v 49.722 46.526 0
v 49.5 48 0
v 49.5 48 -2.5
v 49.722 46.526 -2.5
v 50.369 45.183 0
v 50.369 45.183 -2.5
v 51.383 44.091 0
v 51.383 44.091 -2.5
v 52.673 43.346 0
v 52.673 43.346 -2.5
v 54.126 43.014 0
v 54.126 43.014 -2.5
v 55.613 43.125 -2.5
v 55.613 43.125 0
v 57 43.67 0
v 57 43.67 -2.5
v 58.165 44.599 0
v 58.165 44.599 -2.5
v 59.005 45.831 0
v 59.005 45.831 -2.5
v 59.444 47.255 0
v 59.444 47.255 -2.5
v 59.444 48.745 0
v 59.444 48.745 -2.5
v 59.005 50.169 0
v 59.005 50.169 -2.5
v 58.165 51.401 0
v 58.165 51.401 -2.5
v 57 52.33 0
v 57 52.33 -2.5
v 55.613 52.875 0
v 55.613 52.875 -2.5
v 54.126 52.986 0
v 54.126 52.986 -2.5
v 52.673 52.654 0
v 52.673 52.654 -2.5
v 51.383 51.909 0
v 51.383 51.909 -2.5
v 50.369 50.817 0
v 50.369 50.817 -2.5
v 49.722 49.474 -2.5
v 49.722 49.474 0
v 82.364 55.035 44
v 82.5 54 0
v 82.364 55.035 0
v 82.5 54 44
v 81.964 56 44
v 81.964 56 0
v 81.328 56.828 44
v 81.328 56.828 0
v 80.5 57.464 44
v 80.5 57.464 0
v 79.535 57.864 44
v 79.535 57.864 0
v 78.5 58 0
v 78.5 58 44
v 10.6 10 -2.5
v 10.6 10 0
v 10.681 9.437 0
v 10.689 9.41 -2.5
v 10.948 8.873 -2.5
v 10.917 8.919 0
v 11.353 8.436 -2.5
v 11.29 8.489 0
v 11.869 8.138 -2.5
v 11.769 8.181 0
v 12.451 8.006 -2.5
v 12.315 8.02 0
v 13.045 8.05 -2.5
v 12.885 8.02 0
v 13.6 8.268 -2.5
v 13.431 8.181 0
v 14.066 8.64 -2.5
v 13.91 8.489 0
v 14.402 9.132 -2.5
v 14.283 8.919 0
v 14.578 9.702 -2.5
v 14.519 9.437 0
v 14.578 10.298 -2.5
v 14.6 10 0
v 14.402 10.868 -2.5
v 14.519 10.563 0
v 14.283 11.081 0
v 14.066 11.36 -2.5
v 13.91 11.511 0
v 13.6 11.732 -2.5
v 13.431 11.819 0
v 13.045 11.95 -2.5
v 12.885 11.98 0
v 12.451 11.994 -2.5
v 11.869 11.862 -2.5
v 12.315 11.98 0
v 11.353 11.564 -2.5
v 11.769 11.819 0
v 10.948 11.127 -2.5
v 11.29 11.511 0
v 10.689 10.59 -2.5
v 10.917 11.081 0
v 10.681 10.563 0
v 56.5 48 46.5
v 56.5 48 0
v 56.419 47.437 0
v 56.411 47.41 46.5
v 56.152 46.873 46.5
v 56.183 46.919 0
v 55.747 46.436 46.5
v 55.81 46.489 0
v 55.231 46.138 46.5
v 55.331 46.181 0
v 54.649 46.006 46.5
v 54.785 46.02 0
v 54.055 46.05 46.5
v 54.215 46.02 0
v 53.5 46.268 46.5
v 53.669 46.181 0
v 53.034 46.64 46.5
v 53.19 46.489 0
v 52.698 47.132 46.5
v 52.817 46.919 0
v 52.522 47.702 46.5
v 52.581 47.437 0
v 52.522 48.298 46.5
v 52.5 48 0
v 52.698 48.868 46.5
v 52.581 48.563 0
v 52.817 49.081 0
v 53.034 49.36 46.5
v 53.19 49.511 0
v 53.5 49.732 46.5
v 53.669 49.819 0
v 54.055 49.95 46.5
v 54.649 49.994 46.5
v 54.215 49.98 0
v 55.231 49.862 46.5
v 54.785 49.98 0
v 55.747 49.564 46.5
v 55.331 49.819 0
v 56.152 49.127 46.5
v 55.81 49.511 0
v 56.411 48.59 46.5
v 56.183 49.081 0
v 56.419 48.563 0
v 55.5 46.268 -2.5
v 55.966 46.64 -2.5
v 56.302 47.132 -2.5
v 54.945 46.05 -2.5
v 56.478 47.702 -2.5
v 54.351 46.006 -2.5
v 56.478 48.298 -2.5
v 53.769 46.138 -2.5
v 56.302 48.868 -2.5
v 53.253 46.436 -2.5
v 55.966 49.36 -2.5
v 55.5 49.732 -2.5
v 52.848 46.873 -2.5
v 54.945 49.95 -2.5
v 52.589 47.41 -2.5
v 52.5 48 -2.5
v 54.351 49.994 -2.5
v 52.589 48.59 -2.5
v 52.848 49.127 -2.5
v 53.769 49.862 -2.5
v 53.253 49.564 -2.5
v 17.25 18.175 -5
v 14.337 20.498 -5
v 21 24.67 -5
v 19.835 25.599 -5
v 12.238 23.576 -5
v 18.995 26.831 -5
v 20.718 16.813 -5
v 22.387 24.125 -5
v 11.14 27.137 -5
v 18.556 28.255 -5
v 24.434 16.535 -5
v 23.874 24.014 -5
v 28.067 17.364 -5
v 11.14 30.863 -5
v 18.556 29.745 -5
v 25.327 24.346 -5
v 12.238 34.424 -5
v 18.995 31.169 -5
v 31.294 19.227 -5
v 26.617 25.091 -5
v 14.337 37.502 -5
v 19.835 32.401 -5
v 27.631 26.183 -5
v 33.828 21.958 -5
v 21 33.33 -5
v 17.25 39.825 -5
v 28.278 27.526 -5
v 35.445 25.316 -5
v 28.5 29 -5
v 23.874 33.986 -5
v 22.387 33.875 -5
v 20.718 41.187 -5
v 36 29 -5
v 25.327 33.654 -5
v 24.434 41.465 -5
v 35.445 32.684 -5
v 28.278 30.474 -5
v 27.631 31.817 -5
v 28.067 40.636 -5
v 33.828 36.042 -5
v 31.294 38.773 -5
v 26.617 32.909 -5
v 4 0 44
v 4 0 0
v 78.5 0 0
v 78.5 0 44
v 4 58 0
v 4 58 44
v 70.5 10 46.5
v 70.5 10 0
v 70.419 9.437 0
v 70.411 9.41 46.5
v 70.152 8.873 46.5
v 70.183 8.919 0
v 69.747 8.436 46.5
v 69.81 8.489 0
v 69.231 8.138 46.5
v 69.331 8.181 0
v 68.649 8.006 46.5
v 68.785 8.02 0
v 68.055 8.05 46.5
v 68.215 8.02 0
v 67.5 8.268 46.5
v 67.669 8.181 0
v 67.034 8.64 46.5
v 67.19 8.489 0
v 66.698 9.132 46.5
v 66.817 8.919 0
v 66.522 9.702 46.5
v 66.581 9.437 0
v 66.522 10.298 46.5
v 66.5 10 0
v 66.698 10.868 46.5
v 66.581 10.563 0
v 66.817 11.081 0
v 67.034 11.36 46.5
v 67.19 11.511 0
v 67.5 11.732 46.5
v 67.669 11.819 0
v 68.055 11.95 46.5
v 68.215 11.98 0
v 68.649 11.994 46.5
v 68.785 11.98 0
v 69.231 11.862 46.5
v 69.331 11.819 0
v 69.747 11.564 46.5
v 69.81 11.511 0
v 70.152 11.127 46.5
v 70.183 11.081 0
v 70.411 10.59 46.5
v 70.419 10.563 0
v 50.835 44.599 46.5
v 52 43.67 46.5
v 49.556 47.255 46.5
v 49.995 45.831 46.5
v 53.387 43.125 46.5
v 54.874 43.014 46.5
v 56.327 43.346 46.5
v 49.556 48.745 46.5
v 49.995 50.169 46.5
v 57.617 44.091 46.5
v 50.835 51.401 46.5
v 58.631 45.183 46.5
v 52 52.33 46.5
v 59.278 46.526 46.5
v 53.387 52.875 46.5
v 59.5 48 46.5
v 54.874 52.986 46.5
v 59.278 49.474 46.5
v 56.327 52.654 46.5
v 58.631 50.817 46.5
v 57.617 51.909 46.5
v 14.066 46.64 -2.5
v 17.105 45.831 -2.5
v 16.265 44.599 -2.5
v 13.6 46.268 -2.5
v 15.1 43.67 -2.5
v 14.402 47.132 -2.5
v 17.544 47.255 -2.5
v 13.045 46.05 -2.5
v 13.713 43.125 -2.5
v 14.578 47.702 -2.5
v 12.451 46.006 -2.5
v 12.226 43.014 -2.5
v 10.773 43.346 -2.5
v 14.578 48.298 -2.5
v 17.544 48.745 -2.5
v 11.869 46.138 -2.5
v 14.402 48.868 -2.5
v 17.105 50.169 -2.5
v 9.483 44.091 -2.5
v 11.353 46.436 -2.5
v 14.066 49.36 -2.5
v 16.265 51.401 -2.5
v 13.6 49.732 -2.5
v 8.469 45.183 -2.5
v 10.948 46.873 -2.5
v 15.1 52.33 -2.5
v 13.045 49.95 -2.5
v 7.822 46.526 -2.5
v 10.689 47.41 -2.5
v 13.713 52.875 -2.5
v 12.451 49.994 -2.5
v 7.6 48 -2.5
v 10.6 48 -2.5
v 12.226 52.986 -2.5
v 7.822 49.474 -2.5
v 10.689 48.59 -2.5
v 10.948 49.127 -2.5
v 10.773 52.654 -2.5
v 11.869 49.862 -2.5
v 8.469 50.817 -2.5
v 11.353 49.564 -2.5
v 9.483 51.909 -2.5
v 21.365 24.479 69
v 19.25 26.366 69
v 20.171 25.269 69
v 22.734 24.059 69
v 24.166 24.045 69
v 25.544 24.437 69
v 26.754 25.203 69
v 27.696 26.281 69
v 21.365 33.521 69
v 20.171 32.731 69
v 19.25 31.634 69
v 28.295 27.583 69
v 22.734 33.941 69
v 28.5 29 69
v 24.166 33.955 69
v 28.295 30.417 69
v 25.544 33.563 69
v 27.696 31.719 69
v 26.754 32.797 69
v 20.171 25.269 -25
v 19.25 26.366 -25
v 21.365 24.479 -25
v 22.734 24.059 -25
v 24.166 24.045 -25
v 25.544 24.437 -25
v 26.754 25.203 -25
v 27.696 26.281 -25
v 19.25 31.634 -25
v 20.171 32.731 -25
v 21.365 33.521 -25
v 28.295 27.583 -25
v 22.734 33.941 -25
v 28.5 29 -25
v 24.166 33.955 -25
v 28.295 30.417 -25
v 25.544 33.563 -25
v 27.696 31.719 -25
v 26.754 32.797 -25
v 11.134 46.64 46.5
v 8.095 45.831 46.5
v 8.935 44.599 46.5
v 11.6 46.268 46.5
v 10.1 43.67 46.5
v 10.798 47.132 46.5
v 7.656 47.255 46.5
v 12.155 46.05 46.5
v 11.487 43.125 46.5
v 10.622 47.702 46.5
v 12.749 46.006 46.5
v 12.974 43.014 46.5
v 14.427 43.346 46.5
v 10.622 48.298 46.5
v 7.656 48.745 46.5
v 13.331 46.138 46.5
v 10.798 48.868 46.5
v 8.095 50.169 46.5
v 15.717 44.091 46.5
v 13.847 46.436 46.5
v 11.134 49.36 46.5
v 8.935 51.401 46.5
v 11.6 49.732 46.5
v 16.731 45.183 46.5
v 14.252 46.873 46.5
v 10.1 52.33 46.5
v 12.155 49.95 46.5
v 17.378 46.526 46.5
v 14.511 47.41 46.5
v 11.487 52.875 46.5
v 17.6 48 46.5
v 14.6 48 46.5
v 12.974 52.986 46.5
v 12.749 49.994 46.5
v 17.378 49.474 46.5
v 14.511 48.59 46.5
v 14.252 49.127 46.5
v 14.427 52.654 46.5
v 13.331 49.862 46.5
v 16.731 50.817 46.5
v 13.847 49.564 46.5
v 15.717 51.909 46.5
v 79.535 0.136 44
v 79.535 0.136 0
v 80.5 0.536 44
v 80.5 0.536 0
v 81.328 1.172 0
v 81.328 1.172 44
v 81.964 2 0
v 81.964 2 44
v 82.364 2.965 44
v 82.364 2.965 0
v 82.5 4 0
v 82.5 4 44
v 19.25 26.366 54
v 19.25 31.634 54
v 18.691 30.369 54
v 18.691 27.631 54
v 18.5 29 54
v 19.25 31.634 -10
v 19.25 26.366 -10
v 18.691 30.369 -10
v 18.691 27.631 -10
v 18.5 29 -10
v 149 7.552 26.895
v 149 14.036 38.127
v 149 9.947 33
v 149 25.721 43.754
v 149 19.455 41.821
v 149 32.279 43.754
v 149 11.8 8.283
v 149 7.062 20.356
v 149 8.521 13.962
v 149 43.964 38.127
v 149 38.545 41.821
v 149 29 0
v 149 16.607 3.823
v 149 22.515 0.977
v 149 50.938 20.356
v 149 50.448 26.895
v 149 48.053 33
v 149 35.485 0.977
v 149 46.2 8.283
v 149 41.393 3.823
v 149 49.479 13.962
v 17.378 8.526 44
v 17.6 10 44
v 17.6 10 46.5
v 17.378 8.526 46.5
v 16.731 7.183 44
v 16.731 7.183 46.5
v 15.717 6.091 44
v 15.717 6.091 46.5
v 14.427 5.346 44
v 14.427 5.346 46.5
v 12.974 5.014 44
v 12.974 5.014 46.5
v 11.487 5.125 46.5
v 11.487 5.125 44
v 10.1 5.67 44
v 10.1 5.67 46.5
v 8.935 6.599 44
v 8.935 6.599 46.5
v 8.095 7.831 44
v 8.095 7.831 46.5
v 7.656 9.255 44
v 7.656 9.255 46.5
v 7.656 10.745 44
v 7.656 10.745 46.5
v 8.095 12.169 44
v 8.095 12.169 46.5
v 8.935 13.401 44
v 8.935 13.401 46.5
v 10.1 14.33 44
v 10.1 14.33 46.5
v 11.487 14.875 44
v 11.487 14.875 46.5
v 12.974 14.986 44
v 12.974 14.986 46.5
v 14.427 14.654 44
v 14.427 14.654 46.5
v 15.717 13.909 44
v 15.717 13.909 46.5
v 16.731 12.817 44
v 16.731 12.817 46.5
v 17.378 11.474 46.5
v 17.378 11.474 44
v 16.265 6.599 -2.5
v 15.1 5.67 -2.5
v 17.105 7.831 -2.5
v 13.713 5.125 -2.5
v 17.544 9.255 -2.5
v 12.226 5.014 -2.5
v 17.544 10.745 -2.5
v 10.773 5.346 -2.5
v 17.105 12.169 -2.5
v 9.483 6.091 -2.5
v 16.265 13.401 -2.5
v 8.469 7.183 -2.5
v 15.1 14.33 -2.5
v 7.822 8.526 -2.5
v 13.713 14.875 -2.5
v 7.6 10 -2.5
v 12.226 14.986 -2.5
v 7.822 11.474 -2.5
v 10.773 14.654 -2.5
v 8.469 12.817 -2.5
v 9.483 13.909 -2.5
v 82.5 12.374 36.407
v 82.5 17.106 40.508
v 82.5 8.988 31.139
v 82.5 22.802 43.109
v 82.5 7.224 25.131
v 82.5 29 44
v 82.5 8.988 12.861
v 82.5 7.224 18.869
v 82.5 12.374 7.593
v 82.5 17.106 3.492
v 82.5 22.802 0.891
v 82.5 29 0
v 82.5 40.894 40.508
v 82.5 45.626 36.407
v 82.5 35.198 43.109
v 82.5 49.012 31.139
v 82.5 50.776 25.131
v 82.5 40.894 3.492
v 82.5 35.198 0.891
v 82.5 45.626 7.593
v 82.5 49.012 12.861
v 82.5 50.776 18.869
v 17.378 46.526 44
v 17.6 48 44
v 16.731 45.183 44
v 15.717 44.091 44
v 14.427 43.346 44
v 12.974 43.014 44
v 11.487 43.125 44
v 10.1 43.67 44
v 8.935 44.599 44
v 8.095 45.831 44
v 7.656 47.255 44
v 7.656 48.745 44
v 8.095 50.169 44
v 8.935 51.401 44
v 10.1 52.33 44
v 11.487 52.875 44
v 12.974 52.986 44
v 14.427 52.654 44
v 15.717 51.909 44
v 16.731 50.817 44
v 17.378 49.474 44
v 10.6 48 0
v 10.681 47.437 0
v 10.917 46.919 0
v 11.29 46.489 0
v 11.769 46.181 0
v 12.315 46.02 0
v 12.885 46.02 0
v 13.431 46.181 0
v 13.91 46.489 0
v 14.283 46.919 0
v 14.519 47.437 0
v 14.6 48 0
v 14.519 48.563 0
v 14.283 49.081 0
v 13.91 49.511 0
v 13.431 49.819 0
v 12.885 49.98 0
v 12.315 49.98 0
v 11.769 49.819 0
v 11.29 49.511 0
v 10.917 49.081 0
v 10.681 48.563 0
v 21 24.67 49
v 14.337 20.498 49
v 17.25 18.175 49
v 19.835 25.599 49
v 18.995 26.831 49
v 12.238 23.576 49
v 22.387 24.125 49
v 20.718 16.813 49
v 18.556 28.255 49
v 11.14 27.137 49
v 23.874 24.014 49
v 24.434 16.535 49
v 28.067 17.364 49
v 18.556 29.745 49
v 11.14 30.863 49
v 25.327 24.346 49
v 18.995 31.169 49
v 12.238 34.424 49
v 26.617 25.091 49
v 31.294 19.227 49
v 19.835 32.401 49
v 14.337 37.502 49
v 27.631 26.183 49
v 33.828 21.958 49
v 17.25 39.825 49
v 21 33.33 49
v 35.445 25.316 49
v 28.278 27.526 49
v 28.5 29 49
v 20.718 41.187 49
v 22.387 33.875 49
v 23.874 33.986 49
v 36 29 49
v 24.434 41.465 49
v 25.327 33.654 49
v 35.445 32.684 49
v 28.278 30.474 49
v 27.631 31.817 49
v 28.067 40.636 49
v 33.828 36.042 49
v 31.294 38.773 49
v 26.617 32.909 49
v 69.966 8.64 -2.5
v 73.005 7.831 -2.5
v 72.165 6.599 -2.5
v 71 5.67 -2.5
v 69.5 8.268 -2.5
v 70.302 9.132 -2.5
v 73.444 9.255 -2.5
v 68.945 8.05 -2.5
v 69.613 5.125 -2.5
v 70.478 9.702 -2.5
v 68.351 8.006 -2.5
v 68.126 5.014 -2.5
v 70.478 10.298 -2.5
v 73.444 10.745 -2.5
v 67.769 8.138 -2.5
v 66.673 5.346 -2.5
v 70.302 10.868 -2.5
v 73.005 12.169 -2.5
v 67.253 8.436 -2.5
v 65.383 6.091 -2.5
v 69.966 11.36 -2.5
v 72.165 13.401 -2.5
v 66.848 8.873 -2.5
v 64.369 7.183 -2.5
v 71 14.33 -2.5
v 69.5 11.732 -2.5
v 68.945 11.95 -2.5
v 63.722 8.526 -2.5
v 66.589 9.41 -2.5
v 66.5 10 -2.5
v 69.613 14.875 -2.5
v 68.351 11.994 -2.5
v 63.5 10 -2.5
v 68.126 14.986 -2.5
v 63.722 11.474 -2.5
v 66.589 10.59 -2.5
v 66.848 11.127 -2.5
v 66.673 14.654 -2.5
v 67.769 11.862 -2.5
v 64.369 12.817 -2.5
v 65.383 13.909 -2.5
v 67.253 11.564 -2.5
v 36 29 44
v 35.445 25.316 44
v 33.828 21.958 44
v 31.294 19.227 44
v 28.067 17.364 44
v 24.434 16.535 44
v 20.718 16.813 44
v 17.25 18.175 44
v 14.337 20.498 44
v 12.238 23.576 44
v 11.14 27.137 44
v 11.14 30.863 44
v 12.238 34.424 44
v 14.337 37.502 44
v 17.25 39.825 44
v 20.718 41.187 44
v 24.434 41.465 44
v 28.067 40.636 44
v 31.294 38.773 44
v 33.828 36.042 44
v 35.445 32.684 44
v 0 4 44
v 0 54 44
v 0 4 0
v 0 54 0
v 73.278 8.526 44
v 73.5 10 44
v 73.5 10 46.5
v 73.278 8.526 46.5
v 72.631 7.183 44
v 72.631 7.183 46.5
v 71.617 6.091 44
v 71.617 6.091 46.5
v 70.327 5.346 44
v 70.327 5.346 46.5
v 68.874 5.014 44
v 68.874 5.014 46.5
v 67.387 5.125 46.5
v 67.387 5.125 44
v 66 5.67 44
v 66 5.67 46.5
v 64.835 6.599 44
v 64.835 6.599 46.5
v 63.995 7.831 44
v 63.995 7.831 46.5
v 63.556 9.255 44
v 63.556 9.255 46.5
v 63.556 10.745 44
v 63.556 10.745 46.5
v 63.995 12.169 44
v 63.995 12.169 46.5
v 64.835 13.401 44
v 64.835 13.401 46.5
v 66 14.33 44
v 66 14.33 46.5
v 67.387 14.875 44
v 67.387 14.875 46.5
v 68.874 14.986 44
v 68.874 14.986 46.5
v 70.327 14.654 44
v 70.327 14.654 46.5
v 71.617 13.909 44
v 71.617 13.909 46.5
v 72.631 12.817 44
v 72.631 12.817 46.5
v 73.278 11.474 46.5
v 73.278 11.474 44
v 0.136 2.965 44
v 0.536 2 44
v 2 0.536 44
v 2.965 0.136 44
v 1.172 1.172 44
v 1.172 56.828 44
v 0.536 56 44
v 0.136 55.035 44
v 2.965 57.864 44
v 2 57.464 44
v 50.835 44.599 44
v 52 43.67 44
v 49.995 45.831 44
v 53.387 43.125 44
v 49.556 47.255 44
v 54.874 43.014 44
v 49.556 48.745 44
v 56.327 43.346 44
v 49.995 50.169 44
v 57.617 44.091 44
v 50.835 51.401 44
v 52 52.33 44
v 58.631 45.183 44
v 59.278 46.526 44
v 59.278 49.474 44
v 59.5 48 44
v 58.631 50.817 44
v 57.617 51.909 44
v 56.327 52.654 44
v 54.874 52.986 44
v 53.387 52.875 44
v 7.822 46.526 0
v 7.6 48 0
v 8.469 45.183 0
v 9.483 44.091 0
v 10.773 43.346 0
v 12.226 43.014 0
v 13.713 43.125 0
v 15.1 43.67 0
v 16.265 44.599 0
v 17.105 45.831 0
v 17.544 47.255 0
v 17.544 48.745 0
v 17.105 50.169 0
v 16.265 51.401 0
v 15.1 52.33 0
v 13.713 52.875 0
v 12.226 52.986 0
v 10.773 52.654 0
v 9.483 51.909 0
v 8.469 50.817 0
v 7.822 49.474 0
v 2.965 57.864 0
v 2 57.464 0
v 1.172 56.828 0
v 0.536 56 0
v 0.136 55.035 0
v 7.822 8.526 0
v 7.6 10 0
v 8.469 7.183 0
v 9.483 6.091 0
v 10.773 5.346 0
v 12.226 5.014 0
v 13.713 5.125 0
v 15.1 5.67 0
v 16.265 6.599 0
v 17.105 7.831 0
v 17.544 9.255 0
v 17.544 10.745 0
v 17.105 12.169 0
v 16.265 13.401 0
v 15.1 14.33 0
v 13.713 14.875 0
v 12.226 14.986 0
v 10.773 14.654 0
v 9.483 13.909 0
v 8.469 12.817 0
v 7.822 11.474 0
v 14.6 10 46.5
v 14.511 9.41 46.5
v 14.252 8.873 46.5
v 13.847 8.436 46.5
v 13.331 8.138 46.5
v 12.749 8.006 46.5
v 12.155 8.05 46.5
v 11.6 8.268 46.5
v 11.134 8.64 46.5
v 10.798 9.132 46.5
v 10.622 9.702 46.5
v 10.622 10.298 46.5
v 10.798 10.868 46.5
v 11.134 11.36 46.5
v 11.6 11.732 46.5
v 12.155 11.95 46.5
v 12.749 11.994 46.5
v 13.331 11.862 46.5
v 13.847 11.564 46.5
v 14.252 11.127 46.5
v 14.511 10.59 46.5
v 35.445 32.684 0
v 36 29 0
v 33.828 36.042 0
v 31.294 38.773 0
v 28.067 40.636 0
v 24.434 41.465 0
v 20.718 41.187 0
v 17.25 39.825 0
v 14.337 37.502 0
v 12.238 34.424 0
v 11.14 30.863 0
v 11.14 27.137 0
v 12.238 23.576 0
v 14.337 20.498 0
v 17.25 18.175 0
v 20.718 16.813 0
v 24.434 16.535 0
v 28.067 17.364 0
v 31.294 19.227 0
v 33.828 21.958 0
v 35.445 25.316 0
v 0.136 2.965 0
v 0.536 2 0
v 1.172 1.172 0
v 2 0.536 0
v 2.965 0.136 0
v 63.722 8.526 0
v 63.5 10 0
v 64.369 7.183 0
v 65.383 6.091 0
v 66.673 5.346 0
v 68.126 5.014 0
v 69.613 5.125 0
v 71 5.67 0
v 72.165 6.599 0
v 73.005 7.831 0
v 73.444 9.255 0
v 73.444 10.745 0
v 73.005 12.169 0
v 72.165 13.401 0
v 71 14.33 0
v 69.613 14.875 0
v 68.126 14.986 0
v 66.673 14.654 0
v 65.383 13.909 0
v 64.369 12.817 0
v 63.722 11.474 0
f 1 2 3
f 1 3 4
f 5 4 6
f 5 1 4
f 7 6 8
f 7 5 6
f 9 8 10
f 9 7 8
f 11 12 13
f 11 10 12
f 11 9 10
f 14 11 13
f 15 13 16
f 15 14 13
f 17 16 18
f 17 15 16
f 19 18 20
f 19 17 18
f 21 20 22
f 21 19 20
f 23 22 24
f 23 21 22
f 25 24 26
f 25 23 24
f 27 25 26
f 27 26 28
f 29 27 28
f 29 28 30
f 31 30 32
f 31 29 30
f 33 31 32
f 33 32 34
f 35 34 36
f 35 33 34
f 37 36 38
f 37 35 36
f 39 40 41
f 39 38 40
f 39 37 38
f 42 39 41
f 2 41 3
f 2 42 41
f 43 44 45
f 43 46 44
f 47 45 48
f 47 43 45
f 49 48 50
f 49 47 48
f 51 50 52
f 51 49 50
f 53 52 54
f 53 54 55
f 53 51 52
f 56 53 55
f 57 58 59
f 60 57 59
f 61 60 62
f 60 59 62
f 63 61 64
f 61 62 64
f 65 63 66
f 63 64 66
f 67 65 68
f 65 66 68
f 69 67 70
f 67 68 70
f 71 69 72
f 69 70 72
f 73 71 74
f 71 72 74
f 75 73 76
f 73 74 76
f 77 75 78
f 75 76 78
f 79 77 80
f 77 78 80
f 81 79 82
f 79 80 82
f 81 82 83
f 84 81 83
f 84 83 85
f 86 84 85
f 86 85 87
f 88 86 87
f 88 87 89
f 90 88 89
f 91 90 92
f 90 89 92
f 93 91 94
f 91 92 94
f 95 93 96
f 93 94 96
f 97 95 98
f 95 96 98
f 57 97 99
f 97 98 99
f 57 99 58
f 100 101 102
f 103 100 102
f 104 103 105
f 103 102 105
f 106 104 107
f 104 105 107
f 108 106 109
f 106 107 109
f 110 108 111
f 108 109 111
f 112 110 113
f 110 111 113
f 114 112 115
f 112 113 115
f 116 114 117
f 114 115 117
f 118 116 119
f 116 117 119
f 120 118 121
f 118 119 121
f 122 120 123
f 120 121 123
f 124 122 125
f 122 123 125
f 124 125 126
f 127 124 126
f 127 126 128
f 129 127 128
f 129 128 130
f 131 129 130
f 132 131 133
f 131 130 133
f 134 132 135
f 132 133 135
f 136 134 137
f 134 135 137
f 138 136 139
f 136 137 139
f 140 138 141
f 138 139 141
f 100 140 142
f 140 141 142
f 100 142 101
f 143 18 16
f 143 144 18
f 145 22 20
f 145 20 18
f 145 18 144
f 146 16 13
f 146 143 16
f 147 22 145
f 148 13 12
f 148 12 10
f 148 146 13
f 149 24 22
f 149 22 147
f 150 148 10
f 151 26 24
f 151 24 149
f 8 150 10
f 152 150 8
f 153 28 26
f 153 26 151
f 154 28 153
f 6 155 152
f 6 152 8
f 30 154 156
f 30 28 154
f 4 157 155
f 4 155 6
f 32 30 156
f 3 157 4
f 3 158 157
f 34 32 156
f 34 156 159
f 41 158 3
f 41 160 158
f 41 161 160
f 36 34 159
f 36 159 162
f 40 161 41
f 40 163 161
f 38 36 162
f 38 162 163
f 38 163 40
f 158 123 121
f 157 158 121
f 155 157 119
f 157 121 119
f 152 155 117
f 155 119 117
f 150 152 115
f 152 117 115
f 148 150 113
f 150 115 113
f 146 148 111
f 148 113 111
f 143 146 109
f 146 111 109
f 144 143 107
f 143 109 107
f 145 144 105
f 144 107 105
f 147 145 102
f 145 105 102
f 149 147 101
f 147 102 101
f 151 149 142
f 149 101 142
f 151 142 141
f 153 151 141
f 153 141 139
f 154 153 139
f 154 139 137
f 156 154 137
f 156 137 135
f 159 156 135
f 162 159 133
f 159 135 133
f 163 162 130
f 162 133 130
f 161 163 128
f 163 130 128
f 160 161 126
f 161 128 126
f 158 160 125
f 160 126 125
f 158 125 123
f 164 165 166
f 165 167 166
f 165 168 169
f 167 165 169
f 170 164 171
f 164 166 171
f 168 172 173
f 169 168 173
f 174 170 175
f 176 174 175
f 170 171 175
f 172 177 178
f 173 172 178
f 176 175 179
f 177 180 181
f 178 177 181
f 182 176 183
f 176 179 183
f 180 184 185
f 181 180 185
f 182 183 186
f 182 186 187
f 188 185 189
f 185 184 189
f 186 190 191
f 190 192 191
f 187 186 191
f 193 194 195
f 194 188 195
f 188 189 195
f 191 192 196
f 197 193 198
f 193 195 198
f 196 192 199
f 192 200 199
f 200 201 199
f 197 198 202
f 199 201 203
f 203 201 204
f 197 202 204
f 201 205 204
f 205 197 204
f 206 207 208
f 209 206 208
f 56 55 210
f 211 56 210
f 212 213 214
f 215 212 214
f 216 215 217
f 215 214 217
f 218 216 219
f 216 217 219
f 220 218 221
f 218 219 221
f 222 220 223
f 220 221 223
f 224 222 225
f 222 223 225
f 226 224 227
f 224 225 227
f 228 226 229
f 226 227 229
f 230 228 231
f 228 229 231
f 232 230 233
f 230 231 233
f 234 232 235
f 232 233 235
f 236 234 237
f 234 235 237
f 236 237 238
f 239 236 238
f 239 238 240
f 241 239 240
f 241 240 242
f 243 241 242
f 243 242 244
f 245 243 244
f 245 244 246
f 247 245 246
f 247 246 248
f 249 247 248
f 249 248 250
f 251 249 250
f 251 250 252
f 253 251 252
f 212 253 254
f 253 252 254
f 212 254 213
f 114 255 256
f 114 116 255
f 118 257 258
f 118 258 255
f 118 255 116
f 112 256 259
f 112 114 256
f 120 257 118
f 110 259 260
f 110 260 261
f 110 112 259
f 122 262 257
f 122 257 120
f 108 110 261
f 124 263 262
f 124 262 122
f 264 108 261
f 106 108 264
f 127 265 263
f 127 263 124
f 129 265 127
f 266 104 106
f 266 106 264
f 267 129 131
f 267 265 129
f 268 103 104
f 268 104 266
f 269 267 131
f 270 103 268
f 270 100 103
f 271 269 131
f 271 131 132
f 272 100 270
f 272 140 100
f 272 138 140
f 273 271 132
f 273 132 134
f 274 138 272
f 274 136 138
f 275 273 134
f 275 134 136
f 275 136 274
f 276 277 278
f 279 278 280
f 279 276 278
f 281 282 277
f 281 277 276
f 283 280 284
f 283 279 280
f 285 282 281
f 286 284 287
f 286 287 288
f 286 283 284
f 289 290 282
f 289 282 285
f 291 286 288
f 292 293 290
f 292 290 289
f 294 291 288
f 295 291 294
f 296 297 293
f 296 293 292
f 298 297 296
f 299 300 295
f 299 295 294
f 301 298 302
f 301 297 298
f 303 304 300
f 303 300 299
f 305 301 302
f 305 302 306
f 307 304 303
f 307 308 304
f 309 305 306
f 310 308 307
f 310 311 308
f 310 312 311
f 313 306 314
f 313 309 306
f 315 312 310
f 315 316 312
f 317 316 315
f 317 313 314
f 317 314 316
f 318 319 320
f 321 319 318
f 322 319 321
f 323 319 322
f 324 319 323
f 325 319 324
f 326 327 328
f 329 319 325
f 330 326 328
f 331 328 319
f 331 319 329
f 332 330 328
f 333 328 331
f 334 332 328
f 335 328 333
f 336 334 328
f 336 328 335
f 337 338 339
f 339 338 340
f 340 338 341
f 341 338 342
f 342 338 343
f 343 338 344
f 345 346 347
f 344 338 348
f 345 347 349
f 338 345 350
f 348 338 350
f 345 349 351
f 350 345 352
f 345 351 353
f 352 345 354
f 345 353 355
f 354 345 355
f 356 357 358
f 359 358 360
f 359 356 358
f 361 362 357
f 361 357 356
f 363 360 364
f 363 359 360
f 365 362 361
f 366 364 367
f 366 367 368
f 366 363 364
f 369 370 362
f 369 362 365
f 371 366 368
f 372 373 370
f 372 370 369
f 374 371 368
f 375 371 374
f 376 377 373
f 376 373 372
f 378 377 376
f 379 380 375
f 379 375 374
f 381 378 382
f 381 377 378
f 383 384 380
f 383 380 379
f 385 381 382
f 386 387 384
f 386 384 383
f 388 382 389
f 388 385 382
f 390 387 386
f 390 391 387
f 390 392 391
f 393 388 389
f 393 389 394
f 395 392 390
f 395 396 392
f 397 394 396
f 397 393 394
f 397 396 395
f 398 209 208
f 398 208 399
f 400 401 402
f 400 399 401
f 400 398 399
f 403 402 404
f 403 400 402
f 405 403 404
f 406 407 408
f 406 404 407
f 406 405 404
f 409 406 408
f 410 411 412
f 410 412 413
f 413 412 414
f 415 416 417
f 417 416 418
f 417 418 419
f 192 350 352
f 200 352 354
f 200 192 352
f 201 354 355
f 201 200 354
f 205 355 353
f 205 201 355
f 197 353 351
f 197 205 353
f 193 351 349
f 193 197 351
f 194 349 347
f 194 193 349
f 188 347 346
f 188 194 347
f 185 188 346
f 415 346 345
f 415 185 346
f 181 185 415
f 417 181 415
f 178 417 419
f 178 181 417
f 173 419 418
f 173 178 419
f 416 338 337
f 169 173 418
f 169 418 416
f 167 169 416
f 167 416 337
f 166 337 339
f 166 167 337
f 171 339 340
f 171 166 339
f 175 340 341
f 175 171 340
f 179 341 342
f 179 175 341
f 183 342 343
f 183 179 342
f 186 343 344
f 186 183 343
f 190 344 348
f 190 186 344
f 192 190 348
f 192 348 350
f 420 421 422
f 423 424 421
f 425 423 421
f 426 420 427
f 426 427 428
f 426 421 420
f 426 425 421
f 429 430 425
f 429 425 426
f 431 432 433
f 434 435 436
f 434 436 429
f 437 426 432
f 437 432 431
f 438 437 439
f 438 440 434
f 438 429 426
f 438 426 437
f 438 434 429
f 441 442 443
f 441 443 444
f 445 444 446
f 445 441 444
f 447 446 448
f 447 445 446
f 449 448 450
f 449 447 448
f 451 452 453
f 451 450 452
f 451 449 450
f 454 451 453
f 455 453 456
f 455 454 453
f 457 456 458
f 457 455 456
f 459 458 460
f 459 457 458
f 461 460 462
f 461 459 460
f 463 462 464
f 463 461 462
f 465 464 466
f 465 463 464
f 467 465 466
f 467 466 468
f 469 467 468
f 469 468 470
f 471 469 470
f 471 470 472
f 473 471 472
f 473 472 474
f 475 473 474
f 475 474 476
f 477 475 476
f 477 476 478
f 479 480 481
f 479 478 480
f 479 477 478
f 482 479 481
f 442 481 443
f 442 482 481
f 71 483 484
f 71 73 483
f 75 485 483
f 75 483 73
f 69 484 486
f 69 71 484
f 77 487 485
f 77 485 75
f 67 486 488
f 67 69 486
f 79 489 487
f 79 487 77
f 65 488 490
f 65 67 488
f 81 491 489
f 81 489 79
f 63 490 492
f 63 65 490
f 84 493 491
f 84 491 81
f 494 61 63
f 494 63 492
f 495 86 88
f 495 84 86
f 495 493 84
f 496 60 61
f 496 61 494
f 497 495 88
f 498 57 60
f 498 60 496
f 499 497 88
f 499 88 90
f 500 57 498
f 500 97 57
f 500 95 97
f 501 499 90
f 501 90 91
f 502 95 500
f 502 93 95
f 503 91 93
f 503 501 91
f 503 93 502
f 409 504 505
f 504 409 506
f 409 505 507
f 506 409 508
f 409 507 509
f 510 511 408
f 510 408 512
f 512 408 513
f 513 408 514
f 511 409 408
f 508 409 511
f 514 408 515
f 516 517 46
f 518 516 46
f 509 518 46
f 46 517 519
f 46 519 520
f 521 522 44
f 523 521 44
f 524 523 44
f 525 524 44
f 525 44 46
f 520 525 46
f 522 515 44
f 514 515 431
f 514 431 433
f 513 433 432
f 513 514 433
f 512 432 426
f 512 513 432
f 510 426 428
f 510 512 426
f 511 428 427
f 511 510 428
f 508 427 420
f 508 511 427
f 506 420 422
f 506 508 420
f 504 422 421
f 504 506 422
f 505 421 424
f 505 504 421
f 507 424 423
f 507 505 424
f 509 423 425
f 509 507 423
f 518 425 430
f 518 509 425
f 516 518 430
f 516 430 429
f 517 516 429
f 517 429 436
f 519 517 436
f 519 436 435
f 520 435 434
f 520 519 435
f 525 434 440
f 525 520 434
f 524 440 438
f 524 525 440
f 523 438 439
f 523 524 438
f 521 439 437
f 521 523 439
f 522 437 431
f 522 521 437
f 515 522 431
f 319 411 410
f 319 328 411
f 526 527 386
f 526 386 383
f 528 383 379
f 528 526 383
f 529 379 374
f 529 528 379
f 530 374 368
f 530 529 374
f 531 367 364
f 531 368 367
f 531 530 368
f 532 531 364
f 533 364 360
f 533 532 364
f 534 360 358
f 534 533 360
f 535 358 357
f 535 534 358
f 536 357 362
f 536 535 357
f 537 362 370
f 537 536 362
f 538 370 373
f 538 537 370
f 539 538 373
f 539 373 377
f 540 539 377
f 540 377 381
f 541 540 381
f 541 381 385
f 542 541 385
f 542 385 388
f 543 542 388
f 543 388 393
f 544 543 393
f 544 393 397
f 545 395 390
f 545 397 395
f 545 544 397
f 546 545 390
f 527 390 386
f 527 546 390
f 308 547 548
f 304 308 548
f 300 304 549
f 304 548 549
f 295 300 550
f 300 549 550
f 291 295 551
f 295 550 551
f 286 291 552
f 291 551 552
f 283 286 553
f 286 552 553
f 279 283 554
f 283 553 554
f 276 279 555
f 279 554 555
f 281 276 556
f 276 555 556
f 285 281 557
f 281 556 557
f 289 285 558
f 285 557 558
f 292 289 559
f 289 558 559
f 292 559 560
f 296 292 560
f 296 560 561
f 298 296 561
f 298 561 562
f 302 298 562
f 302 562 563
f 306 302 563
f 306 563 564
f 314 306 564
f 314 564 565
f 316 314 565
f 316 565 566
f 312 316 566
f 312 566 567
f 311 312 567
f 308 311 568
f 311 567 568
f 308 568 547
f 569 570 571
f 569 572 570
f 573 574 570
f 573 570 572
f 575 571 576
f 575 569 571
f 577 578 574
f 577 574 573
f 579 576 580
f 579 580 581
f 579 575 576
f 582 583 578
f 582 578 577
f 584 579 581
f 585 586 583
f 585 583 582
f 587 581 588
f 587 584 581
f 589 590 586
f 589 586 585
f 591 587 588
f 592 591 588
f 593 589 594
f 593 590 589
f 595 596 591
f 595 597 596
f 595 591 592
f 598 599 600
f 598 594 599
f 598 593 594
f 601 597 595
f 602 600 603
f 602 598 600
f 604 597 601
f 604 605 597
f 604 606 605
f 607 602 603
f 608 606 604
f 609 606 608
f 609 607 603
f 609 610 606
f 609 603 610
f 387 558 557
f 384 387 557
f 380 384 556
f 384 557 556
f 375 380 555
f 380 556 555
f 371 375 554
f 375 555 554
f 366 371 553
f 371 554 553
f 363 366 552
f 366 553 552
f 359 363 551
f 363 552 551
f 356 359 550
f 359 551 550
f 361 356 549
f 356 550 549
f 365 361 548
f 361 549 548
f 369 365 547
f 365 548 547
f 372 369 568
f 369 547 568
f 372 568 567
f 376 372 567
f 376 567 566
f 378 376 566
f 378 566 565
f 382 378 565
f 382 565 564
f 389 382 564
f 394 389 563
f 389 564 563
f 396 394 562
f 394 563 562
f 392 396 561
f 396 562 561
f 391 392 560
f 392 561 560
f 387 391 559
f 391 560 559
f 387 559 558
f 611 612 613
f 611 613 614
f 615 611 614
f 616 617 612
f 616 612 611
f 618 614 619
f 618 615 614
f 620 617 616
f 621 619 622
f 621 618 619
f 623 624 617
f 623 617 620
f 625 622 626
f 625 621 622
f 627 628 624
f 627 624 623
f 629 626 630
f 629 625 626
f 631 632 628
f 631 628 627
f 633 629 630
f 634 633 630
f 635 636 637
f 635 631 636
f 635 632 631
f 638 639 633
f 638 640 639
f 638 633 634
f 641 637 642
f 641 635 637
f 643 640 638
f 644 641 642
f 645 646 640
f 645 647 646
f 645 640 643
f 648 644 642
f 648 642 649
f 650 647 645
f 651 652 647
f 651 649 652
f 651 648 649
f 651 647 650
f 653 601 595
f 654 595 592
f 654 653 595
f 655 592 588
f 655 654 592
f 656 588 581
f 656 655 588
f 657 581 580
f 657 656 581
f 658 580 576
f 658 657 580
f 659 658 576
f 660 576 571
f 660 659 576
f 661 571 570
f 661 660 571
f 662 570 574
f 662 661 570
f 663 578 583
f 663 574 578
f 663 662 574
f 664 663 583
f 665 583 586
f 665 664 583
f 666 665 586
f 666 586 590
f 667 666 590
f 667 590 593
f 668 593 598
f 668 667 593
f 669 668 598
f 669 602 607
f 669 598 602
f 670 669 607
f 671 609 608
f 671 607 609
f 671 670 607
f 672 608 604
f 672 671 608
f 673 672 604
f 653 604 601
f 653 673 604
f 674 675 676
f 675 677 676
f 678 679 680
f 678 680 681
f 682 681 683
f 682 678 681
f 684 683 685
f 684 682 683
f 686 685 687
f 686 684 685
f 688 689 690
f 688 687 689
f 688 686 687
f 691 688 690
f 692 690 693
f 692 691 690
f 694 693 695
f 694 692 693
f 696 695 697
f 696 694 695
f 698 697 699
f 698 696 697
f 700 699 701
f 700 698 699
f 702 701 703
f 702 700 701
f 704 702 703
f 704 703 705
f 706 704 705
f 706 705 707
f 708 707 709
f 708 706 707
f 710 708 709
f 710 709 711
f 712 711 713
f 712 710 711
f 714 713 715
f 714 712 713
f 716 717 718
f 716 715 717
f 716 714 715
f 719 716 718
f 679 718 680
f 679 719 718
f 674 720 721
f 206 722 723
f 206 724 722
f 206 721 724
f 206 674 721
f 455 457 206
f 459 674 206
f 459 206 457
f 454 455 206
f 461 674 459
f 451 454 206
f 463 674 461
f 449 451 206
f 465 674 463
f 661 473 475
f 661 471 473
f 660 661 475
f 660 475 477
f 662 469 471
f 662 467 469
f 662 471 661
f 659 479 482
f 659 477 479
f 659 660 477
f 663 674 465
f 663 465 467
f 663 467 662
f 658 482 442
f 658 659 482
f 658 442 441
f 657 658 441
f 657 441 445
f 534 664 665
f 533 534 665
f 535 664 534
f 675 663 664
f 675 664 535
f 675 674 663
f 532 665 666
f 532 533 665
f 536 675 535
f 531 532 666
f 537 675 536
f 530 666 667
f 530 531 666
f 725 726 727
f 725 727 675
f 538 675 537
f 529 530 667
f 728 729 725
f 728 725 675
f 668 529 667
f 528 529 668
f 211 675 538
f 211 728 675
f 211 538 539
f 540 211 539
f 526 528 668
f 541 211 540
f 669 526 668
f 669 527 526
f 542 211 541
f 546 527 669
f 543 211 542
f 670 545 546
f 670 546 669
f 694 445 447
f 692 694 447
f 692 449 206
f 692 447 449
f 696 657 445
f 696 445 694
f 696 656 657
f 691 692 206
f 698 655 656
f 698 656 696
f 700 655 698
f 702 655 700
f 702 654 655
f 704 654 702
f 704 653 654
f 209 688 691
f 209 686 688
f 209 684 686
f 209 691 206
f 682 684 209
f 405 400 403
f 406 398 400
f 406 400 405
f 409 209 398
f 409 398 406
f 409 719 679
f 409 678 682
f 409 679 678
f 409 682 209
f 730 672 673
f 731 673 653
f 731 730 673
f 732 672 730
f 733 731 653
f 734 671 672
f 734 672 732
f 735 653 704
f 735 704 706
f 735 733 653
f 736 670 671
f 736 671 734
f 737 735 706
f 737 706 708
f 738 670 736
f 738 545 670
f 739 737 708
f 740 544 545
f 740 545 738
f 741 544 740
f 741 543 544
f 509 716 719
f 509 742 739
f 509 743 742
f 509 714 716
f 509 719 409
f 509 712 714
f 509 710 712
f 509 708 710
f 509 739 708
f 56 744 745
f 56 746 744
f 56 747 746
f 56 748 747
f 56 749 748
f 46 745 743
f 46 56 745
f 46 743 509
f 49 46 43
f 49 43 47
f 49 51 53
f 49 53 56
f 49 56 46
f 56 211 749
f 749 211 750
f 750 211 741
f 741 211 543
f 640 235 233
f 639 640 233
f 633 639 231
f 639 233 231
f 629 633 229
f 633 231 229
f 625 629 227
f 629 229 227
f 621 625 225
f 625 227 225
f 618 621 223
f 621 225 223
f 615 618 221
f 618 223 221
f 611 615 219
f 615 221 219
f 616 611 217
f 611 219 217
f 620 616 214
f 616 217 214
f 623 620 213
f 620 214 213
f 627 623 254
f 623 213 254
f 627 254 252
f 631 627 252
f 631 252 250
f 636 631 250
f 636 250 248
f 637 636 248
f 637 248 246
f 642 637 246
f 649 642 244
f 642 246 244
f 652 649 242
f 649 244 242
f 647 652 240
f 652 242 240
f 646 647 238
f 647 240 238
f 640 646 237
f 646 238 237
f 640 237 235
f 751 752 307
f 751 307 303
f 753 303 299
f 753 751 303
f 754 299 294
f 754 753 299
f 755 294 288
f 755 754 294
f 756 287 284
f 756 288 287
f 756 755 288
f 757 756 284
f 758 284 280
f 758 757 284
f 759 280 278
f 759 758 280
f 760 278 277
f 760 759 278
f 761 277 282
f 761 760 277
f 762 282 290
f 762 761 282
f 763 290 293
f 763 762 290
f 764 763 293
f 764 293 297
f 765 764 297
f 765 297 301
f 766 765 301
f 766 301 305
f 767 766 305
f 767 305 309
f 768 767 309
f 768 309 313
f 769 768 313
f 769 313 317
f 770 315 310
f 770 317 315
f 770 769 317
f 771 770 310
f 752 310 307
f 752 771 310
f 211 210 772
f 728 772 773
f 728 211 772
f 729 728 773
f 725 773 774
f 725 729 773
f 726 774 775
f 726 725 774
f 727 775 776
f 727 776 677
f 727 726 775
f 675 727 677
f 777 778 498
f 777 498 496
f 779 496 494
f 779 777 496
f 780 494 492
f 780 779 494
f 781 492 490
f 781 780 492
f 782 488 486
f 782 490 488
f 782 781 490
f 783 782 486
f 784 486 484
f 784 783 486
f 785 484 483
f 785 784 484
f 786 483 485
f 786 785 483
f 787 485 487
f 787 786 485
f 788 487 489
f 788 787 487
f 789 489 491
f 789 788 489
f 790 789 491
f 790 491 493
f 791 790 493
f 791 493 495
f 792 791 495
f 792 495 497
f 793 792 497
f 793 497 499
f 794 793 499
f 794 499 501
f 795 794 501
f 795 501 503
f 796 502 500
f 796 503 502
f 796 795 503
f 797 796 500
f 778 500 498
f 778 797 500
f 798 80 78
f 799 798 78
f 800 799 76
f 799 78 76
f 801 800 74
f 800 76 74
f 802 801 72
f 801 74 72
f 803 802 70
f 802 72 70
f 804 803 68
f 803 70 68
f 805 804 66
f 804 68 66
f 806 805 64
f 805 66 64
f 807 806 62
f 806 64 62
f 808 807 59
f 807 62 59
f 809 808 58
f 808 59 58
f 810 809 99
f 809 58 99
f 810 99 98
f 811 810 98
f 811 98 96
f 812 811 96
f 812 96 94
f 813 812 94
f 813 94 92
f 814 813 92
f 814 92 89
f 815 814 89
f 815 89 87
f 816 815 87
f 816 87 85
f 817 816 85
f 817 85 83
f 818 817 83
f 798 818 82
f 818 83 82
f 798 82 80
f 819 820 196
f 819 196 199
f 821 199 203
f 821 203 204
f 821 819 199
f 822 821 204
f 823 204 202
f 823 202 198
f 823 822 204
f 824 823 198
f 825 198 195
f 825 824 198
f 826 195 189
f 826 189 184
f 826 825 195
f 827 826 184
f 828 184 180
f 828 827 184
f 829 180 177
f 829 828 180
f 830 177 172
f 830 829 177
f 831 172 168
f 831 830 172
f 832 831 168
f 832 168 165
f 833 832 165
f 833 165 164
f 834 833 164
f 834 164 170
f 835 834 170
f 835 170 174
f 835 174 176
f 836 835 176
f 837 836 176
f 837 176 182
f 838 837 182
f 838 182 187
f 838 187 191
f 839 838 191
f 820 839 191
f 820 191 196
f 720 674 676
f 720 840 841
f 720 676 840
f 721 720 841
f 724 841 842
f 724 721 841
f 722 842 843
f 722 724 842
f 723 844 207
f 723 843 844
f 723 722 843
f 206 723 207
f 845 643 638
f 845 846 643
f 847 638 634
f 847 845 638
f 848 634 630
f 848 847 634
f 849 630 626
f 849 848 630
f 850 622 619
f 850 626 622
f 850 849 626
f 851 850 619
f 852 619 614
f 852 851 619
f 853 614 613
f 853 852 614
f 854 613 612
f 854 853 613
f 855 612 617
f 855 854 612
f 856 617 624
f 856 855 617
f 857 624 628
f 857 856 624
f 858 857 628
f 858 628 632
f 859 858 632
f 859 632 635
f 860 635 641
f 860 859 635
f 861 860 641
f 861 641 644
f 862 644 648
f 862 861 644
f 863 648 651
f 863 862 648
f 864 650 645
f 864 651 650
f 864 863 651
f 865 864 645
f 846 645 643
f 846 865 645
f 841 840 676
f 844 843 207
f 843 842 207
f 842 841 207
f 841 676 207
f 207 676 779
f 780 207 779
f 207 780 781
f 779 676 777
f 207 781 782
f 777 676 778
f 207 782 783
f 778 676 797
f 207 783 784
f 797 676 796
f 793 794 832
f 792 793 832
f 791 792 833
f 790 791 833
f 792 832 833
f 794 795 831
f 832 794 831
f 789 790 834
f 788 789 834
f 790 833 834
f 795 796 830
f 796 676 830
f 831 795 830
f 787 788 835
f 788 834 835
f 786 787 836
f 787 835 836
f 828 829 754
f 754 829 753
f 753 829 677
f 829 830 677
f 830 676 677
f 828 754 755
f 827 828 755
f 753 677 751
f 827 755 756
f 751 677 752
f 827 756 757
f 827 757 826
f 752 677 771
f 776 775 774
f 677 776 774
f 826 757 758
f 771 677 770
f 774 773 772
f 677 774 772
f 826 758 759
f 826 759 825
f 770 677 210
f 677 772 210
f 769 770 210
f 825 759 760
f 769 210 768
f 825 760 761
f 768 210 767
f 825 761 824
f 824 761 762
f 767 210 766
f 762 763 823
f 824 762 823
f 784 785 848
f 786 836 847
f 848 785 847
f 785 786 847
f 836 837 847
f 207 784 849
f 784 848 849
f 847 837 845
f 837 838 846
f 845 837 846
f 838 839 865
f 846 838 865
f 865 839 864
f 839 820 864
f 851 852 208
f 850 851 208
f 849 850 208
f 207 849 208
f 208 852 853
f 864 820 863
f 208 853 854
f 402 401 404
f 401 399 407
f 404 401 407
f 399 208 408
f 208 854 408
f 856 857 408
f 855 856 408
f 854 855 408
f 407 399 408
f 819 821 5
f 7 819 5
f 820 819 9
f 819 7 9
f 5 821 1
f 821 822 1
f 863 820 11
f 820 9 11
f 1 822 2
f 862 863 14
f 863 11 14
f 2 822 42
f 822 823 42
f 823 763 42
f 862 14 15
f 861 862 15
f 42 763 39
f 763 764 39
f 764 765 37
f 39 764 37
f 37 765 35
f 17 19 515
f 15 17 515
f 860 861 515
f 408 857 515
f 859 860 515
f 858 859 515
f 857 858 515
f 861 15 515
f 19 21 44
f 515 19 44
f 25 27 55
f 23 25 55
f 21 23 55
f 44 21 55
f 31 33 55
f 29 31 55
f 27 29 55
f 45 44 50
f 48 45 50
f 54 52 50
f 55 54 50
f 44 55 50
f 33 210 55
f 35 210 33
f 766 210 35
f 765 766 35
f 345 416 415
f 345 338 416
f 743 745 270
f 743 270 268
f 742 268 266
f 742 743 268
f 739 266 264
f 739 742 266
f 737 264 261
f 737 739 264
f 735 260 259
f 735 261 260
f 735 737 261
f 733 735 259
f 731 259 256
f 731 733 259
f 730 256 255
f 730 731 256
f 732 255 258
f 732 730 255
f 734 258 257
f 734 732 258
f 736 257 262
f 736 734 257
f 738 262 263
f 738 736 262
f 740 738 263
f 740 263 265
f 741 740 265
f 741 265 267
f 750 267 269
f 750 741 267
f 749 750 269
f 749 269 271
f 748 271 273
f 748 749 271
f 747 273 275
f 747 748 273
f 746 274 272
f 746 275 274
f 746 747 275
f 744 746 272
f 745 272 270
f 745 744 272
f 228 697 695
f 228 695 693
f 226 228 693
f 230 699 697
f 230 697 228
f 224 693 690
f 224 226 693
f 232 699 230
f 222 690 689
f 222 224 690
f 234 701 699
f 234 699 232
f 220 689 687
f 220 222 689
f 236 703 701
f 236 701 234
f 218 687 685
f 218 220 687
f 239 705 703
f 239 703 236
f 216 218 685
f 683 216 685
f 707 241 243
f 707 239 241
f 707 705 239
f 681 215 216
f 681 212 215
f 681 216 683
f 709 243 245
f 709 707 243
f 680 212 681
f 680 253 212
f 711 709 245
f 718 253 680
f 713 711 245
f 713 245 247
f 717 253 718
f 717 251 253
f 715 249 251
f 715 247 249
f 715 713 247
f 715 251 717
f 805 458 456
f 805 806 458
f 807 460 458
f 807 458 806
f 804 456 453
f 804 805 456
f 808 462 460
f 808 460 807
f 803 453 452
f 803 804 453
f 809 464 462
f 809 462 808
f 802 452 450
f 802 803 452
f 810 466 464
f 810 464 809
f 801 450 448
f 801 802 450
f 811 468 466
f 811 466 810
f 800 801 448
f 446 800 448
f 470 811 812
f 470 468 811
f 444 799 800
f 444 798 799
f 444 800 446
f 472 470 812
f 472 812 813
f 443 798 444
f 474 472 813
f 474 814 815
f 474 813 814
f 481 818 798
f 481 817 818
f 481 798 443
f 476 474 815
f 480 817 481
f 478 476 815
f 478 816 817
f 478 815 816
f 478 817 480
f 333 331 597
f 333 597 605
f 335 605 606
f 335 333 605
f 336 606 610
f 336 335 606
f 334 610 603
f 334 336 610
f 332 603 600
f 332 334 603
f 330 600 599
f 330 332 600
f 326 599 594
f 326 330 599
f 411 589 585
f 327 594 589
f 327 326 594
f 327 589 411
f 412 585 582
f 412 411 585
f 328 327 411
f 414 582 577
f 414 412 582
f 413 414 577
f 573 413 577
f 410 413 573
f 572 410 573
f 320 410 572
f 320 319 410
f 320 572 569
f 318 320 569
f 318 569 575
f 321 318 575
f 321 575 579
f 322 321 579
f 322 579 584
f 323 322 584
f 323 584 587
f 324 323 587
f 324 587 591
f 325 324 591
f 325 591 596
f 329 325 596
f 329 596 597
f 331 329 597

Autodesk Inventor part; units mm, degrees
ref_plane "YZ Plane" through (0, 0, 0) normal (1, 0, 0) x (0, 1, 0)
ref_plane "XZ Plane" through (0, 0, 0) normal (0, 1, 0) x (-1, 0, 0)
ref_plane "XY Plane" through (0, 0, 0) normal (0, 0, 1) x (1, 0, 0)
sketch "Sketch1" plane through (0, 0, 0) normal (0, 0, 1) x (1, 0, 0)
  line L0 (0, 0) -> (82.5, 0)
  line L1 (82.5, 0) -> (82.5, 58)
  line L2 (82.5, 58) -> (0, 58)
  line L3 (0, 58) -> (0, 0)
  line L4 (12.6, 10) -> (68.5, 10) construction
  line L5 (68.5, 10) -> (68.5, 48) construction
  line L6 (68.5, 48) -> (12.6, 48) construction
  line L7 (12.6, 48) -> (12.6, 10) construction
  circle A0 centre (12.6, 48) radius 2
  circle A1 centre (12.6, 10) radius 2
  circle A2 centre (68.5, 10) radius 2
  circle A3 centre (54.5, 48) radius 2
  circle A4 centre (23.5, 29) radius 12.5
  circle A5 centre (23.5, 29) radius 5
  point P0 (12.6, 29)
  point P1 (0, 29)
  dimension "d0" = 82.5
  dimension "d1" = 58
  dimension "d2" = 38
  dimension "d3" = 55.9
  dimension "d4" = 12.6
  dimension "d5" = 4
  dimension "d6" = 4
  dimension "d7" = 4
  dimension "d8" = 4
  dimension "d9" = 25
  dimension "d10" = 41.9
  dimension "d11" = 10.9
  dimension "d12" = 10
extrude "Extrusion1" add sketch "Sketch1" along normal blind 44 contours L3 L2 L1 L0 | A4 | A5
extrude "Extrusion2" add sketch "Sketch1" along normal blind 49 and the other way blind 5 contours A4
extrude "Extrusion3" add sketch "Sketch1" against normal blind 25 and the other way blind 69 contours A5
sketch "Sketch2" plane through (0, 0, 44) normal (0, 0, 1) x (1, 0, 0)
  circle A0 centre (12.6, 48) radius 2 projected
  circle A1 centre (54.5, 48) radius 2 projected
  circle A2 centre (68.5, 10) radius 2 projected
  circle A3 centre (12.6, 10) radius 2 projected
  circle A4 centre (12.6, 48) radius 5
  circle A5 centre (54.5, 48) radius 5
  circle A6 centre (68.5, 10) radius 5
  circle A7 centre (12.6, 10) radius 5
  point P0 (0, 0)
  dimension "d23" = 10
  dimension "d24" = 10
  dimension "d25" = 10
  dimension "d26" = 10
extrude "Extrusion4" add sketch "Sketch2" along normal blind 2.5
sketch "Sketch3" plane through (0, 0, 0) normal (0, 0, -1) x (-1, 0, 0)
  circle A0 centre (-12.6, 48) radius 2 projected
  circle A1 centre (-12.6, 48) radius 5 projected
  circle A2 centre (-12.6, 10) radius 2 projected
  circle A3 centre (-12.6, 10) radius 5 projected
  circle A4 centre (-54.5, 48) radius 2 projected
  circle A5 centre (-54.5, 48) radius 5 projected
  circle A6 centre (-68.5, 10) radius 2 projected
  circle A7 centre (-68.5, 10) radius 5 projected
  point P0 (0, 0)
extrude "Extrusion5" add sketch "Sketch3" along normal blind 2.5
sketch "Sketch4" plane through (82.5, 0, 0) normal (1, 0, 0) x (0, 0, -1)
  circle A0 centre (-22, 29) radius 22
  line L0 (0, 0) -> (0, 58) projected
  line L1 (0, 58) -> (-44, 58) projected
  point P0 (-22, 58)
  point P1 (0, 29)
  dimension "d31" = 44
extrude "Extrusion6" add sketch "Sketch4" along normal blind 66.5
sketch "Sketch5" plane through (23.5, 29, -25) normal (0, 0, -1) x (-1, 0, 0)
  circle A0 centre (0, 0) radius 5 projected
  line L0 (4.25, -2.6339) -> (4.25, 2.6339)
  arc A1 (4.25, -2.6339) -> (4.25, 2.6339) centre (0, 0) ccw
  point P0 (23.5, -29)
  point P1 (4.25, 0)
  dimension "d34" = 4.25
extrude "Extrusion7" cut sketch "Sketch5" against normal blind 15 contours A0 L0 picked at (4.3873, -0.6025)
sketch "Sketch6" plane through (23.5, 29, 69) normal (0, 0, 1) x (1, 0, 0)
  circle A0 centre (0, 0) radius 5 projected
  line L0 (-4.25, 2.6339) -> (-4.25, -2.6339)
  arc A1 (-4.25, 2.6339) -> (-4.25, -2.6339) centre (0, 0) ccw
  point P0 (-23.5, -29)
  point P1 (-4.25, 0)
  dimension "d37" = 4.25
extrude "Extrusion8" cut sketch "Sketch6" against normal blind 15 contours L0 A0 picked at (-4.4085, 0.5446)
fillet "Fillet1" radius 4 4 edges at (82.5, 58, 22) (0, 58, 22) (82.5, 0, 22) (0, 0, 22)
properties part number "TJW83FZY4468-527i" material "Stainless Steel"
